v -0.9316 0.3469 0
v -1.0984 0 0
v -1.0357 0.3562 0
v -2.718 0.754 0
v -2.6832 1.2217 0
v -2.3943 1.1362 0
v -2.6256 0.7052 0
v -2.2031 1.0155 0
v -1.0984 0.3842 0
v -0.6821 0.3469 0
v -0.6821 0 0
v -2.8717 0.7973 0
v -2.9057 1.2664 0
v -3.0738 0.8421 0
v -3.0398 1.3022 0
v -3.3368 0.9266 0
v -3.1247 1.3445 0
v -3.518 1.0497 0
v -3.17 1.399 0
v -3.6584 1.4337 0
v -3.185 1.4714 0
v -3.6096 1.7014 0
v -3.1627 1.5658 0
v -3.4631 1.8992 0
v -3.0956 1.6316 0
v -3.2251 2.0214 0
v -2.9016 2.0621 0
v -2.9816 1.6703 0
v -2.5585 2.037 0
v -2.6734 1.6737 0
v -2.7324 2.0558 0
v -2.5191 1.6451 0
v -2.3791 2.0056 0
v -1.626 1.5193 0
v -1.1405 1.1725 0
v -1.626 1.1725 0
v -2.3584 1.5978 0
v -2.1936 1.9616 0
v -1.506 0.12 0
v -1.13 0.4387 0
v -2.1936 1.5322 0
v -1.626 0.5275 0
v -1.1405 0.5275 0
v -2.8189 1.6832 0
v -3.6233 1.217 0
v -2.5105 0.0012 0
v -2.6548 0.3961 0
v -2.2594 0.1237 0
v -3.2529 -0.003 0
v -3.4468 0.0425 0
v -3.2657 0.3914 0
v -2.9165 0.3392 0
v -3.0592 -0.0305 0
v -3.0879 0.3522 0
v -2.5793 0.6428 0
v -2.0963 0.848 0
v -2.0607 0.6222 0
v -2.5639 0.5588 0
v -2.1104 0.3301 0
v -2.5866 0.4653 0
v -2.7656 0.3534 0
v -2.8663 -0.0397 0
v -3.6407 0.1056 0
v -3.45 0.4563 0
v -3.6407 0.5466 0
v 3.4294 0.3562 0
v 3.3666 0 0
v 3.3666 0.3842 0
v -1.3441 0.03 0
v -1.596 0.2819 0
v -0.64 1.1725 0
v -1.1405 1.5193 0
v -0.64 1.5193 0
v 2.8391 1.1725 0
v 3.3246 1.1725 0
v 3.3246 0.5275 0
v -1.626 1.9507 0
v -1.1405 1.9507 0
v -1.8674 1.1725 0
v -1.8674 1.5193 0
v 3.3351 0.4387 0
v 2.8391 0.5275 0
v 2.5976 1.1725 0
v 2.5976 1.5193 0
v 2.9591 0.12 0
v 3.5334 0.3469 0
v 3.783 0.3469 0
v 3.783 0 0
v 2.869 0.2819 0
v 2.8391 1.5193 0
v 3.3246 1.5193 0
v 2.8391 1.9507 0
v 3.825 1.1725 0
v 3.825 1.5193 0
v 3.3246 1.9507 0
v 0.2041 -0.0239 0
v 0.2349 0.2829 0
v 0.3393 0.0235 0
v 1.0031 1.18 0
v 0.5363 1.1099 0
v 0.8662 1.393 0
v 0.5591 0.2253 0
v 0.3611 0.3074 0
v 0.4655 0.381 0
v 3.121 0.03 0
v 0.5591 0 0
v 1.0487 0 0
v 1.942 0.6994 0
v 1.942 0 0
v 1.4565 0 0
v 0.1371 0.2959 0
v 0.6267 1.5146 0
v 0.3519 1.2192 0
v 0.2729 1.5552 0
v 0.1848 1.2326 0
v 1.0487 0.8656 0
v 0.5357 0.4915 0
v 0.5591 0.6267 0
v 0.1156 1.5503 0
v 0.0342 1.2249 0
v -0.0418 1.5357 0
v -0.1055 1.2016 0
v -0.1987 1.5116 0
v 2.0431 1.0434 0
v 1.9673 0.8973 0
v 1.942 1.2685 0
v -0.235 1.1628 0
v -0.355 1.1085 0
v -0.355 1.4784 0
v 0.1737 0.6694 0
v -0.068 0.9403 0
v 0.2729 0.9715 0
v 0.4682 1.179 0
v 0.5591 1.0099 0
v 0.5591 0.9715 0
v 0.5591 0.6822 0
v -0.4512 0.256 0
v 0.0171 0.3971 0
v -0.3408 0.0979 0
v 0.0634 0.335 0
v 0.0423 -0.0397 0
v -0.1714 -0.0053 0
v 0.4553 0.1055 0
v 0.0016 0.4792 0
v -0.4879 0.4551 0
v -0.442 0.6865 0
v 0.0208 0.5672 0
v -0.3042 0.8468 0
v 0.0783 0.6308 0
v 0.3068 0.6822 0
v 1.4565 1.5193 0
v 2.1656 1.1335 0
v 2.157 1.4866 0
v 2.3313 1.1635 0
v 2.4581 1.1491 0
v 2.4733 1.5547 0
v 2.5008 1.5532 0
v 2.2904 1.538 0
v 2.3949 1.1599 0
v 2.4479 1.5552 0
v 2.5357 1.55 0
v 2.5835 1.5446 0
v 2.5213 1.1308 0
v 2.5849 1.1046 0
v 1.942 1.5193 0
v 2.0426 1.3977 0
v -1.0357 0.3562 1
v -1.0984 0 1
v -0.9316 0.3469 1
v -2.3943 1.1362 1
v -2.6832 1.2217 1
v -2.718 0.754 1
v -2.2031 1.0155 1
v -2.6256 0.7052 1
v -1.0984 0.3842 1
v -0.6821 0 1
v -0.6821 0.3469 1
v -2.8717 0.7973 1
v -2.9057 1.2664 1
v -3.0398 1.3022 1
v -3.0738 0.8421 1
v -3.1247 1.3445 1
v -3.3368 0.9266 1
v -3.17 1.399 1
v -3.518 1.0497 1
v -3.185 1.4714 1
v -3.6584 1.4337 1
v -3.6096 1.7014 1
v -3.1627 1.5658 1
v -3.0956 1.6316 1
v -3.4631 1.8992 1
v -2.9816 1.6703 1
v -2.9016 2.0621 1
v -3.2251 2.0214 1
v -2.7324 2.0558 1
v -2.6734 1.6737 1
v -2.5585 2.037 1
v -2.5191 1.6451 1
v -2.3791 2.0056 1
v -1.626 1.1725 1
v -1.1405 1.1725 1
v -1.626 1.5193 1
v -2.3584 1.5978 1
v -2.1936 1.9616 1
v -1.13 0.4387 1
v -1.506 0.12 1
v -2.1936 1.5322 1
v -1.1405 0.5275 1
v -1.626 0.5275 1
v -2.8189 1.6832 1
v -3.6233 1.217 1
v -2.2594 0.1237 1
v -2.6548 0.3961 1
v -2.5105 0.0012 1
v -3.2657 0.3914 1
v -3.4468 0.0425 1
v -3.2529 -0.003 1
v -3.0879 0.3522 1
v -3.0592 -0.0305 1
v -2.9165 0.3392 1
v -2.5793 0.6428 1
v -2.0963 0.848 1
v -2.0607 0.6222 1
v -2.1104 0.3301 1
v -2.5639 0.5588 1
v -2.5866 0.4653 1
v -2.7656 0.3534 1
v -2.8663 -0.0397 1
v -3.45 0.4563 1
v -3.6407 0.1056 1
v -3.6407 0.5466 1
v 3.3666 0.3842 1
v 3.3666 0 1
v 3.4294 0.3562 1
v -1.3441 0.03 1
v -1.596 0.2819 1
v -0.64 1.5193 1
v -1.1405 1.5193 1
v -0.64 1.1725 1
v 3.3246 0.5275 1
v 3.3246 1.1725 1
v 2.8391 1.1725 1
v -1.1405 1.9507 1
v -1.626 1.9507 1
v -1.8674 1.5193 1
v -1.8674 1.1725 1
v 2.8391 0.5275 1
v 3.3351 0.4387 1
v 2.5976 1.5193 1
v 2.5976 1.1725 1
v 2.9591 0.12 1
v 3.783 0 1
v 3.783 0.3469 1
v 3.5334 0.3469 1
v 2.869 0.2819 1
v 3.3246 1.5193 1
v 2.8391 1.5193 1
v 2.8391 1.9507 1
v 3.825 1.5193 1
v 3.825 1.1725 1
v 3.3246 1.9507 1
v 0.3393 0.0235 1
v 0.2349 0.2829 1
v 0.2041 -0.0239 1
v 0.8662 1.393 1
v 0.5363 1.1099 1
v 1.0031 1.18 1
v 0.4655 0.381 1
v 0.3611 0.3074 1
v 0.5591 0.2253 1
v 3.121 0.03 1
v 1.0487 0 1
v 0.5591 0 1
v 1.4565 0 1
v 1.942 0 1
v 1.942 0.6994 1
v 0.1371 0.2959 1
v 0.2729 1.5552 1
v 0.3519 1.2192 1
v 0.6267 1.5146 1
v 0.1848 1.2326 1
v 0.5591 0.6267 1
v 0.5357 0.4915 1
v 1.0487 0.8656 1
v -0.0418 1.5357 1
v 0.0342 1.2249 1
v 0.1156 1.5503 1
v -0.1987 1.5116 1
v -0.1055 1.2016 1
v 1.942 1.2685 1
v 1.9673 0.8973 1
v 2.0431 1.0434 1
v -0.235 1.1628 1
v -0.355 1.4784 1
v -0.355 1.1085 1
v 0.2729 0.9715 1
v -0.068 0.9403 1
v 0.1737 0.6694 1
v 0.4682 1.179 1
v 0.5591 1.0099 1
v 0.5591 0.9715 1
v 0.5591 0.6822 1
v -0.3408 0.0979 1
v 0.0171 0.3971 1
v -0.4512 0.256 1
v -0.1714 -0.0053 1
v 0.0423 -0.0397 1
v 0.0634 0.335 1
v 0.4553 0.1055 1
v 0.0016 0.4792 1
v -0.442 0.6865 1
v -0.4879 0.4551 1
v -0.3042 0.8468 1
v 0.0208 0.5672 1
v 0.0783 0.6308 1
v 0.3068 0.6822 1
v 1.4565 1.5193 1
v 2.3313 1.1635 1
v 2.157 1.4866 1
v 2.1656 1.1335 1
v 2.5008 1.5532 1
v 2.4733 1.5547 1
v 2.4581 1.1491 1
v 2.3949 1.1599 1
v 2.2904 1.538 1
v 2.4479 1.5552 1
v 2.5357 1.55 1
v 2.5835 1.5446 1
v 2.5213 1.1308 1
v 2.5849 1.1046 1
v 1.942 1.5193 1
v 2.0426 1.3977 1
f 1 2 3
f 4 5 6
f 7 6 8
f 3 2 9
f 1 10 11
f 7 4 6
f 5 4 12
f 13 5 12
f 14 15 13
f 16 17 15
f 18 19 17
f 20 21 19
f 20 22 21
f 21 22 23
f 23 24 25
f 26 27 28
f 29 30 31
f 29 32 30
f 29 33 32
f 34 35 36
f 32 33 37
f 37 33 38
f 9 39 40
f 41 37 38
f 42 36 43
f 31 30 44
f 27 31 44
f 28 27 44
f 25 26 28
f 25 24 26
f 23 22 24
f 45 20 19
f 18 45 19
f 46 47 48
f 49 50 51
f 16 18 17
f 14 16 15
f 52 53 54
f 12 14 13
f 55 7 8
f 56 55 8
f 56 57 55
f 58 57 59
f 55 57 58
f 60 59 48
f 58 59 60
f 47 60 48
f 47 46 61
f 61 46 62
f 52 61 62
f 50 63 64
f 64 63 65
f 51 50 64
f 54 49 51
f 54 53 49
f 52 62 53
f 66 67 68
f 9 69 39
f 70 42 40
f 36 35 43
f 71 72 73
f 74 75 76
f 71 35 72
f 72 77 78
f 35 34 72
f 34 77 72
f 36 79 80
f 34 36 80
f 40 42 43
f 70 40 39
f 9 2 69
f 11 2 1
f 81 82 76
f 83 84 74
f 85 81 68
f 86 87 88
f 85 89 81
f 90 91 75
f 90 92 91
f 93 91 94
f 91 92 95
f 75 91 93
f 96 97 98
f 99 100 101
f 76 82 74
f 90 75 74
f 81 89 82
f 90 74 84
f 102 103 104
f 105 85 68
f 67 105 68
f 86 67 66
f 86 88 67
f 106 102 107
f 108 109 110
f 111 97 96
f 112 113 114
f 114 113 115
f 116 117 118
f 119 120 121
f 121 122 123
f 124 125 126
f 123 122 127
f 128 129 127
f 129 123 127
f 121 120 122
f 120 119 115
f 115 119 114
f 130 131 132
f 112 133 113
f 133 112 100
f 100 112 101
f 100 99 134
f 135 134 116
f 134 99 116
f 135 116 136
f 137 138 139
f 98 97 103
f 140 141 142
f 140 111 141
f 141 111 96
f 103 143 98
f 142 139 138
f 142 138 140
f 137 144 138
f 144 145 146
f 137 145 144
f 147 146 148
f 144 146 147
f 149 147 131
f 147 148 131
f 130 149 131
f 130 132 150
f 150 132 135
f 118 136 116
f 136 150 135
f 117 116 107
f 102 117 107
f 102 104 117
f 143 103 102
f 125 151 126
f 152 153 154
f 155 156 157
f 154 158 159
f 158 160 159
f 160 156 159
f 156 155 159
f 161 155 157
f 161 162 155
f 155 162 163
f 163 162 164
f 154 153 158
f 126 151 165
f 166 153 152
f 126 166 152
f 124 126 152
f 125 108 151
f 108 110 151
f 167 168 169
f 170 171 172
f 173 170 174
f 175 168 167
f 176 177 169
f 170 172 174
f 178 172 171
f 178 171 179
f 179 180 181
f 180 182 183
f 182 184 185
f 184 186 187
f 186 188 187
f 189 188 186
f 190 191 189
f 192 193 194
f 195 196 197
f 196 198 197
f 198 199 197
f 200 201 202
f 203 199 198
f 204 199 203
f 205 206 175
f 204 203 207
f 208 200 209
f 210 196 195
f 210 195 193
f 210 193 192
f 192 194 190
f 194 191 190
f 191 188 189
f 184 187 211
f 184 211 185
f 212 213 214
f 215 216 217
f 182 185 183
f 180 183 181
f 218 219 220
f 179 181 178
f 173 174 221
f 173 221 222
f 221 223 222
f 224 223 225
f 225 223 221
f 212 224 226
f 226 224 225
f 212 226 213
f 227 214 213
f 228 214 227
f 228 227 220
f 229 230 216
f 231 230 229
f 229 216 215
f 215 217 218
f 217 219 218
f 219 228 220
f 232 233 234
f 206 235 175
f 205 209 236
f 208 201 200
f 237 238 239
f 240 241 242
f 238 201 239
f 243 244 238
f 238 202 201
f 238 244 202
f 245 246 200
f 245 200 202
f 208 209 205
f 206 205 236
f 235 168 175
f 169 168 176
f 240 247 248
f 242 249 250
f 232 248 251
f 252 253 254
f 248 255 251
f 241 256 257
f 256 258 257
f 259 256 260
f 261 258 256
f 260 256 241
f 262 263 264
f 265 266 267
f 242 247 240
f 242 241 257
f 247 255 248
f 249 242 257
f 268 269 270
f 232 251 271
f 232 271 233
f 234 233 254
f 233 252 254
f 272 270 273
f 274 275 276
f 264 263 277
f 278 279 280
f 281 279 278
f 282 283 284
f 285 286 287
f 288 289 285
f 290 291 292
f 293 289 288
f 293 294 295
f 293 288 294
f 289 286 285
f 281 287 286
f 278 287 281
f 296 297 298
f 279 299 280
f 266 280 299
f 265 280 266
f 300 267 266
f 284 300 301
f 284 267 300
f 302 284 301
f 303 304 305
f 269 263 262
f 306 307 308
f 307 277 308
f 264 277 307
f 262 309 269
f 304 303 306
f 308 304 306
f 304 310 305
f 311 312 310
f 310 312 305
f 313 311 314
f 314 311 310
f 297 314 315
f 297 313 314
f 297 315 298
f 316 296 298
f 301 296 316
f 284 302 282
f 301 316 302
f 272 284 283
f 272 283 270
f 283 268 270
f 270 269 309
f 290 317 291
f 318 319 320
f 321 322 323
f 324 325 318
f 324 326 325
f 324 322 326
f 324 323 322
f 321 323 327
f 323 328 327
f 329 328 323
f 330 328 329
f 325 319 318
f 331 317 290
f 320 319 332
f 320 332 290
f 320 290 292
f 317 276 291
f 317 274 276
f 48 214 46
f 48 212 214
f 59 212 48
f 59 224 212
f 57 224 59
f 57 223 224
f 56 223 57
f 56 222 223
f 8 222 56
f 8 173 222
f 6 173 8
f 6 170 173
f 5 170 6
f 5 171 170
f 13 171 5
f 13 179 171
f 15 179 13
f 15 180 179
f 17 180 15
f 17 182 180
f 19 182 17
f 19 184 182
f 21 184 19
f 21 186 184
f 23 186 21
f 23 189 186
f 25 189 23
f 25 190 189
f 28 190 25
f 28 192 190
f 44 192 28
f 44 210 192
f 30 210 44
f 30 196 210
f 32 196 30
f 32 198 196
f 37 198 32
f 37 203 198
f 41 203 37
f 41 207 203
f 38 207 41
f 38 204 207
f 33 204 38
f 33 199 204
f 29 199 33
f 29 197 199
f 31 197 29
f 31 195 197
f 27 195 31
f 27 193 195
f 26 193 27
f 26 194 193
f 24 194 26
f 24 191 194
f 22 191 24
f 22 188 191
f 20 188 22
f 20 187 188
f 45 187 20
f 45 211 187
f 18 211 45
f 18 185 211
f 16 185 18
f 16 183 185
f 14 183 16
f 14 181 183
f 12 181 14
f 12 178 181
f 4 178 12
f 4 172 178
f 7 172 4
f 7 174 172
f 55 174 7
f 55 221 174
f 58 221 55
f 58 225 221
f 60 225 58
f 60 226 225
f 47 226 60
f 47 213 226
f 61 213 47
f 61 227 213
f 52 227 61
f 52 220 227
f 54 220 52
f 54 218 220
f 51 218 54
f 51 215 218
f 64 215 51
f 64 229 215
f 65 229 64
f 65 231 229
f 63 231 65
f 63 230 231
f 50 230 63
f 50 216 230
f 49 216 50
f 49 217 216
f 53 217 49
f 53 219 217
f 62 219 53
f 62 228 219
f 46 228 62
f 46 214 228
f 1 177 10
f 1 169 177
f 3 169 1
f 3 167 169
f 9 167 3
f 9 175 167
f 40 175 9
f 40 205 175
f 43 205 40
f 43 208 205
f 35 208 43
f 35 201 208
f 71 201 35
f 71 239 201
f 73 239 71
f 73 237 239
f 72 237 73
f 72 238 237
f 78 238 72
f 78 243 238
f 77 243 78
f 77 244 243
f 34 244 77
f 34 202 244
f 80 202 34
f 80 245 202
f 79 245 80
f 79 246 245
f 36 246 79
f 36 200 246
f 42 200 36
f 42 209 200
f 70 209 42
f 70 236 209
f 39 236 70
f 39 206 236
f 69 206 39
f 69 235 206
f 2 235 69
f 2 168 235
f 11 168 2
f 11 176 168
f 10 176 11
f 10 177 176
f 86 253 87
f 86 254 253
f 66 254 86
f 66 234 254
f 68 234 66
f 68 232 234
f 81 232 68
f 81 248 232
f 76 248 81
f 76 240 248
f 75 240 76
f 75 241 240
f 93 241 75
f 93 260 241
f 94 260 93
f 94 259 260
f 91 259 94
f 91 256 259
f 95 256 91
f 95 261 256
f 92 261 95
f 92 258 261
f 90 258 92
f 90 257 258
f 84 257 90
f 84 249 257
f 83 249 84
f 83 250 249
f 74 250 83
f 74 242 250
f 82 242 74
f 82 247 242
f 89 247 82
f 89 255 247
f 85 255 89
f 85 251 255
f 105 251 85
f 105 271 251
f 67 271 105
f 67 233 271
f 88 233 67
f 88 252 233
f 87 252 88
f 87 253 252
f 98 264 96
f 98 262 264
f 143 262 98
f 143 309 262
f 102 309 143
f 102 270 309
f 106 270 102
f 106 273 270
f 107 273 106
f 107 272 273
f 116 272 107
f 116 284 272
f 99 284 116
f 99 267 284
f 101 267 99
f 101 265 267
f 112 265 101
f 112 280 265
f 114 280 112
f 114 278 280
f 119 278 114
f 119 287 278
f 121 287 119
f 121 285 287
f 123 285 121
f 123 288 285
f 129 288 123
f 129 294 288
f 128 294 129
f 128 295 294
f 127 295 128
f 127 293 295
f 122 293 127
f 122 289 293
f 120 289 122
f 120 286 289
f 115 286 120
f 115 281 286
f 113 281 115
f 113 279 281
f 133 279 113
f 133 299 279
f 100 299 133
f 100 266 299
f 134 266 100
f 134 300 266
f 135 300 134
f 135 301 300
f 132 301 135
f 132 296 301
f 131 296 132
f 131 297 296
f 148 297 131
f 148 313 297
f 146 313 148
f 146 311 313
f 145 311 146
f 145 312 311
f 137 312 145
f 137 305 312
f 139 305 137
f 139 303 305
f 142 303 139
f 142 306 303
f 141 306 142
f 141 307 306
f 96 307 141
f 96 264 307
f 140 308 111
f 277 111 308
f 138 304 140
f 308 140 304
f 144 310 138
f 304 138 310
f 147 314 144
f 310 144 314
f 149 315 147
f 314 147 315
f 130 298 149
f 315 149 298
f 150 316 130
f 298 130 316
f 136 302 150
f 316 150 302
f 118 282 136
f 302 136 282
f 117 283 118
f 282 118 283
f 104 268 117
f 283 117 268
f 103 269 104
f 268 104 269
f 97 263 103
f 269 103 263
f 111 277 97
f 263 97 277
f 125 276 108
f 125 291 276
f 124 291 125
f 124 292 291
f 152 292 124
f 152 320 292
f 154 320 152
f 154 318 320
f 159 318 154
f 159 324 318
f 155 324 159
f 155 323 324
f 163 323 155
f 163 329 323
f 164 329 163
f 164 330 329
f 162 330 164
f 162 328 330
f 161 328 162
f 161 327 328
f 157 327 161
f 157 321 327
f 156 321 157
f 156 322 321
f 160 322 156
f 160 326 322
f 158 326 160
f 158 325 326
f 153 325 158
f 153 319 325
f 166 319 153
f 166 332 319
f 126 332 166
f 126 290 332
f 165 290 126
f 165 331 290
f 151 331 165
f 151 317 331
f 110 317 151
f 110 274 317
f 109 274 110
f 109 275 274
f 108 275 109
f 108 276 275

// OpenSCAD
linear_extrude(1)
text("Start", font="Verdana:style=Bold", size=2, halign="center");
